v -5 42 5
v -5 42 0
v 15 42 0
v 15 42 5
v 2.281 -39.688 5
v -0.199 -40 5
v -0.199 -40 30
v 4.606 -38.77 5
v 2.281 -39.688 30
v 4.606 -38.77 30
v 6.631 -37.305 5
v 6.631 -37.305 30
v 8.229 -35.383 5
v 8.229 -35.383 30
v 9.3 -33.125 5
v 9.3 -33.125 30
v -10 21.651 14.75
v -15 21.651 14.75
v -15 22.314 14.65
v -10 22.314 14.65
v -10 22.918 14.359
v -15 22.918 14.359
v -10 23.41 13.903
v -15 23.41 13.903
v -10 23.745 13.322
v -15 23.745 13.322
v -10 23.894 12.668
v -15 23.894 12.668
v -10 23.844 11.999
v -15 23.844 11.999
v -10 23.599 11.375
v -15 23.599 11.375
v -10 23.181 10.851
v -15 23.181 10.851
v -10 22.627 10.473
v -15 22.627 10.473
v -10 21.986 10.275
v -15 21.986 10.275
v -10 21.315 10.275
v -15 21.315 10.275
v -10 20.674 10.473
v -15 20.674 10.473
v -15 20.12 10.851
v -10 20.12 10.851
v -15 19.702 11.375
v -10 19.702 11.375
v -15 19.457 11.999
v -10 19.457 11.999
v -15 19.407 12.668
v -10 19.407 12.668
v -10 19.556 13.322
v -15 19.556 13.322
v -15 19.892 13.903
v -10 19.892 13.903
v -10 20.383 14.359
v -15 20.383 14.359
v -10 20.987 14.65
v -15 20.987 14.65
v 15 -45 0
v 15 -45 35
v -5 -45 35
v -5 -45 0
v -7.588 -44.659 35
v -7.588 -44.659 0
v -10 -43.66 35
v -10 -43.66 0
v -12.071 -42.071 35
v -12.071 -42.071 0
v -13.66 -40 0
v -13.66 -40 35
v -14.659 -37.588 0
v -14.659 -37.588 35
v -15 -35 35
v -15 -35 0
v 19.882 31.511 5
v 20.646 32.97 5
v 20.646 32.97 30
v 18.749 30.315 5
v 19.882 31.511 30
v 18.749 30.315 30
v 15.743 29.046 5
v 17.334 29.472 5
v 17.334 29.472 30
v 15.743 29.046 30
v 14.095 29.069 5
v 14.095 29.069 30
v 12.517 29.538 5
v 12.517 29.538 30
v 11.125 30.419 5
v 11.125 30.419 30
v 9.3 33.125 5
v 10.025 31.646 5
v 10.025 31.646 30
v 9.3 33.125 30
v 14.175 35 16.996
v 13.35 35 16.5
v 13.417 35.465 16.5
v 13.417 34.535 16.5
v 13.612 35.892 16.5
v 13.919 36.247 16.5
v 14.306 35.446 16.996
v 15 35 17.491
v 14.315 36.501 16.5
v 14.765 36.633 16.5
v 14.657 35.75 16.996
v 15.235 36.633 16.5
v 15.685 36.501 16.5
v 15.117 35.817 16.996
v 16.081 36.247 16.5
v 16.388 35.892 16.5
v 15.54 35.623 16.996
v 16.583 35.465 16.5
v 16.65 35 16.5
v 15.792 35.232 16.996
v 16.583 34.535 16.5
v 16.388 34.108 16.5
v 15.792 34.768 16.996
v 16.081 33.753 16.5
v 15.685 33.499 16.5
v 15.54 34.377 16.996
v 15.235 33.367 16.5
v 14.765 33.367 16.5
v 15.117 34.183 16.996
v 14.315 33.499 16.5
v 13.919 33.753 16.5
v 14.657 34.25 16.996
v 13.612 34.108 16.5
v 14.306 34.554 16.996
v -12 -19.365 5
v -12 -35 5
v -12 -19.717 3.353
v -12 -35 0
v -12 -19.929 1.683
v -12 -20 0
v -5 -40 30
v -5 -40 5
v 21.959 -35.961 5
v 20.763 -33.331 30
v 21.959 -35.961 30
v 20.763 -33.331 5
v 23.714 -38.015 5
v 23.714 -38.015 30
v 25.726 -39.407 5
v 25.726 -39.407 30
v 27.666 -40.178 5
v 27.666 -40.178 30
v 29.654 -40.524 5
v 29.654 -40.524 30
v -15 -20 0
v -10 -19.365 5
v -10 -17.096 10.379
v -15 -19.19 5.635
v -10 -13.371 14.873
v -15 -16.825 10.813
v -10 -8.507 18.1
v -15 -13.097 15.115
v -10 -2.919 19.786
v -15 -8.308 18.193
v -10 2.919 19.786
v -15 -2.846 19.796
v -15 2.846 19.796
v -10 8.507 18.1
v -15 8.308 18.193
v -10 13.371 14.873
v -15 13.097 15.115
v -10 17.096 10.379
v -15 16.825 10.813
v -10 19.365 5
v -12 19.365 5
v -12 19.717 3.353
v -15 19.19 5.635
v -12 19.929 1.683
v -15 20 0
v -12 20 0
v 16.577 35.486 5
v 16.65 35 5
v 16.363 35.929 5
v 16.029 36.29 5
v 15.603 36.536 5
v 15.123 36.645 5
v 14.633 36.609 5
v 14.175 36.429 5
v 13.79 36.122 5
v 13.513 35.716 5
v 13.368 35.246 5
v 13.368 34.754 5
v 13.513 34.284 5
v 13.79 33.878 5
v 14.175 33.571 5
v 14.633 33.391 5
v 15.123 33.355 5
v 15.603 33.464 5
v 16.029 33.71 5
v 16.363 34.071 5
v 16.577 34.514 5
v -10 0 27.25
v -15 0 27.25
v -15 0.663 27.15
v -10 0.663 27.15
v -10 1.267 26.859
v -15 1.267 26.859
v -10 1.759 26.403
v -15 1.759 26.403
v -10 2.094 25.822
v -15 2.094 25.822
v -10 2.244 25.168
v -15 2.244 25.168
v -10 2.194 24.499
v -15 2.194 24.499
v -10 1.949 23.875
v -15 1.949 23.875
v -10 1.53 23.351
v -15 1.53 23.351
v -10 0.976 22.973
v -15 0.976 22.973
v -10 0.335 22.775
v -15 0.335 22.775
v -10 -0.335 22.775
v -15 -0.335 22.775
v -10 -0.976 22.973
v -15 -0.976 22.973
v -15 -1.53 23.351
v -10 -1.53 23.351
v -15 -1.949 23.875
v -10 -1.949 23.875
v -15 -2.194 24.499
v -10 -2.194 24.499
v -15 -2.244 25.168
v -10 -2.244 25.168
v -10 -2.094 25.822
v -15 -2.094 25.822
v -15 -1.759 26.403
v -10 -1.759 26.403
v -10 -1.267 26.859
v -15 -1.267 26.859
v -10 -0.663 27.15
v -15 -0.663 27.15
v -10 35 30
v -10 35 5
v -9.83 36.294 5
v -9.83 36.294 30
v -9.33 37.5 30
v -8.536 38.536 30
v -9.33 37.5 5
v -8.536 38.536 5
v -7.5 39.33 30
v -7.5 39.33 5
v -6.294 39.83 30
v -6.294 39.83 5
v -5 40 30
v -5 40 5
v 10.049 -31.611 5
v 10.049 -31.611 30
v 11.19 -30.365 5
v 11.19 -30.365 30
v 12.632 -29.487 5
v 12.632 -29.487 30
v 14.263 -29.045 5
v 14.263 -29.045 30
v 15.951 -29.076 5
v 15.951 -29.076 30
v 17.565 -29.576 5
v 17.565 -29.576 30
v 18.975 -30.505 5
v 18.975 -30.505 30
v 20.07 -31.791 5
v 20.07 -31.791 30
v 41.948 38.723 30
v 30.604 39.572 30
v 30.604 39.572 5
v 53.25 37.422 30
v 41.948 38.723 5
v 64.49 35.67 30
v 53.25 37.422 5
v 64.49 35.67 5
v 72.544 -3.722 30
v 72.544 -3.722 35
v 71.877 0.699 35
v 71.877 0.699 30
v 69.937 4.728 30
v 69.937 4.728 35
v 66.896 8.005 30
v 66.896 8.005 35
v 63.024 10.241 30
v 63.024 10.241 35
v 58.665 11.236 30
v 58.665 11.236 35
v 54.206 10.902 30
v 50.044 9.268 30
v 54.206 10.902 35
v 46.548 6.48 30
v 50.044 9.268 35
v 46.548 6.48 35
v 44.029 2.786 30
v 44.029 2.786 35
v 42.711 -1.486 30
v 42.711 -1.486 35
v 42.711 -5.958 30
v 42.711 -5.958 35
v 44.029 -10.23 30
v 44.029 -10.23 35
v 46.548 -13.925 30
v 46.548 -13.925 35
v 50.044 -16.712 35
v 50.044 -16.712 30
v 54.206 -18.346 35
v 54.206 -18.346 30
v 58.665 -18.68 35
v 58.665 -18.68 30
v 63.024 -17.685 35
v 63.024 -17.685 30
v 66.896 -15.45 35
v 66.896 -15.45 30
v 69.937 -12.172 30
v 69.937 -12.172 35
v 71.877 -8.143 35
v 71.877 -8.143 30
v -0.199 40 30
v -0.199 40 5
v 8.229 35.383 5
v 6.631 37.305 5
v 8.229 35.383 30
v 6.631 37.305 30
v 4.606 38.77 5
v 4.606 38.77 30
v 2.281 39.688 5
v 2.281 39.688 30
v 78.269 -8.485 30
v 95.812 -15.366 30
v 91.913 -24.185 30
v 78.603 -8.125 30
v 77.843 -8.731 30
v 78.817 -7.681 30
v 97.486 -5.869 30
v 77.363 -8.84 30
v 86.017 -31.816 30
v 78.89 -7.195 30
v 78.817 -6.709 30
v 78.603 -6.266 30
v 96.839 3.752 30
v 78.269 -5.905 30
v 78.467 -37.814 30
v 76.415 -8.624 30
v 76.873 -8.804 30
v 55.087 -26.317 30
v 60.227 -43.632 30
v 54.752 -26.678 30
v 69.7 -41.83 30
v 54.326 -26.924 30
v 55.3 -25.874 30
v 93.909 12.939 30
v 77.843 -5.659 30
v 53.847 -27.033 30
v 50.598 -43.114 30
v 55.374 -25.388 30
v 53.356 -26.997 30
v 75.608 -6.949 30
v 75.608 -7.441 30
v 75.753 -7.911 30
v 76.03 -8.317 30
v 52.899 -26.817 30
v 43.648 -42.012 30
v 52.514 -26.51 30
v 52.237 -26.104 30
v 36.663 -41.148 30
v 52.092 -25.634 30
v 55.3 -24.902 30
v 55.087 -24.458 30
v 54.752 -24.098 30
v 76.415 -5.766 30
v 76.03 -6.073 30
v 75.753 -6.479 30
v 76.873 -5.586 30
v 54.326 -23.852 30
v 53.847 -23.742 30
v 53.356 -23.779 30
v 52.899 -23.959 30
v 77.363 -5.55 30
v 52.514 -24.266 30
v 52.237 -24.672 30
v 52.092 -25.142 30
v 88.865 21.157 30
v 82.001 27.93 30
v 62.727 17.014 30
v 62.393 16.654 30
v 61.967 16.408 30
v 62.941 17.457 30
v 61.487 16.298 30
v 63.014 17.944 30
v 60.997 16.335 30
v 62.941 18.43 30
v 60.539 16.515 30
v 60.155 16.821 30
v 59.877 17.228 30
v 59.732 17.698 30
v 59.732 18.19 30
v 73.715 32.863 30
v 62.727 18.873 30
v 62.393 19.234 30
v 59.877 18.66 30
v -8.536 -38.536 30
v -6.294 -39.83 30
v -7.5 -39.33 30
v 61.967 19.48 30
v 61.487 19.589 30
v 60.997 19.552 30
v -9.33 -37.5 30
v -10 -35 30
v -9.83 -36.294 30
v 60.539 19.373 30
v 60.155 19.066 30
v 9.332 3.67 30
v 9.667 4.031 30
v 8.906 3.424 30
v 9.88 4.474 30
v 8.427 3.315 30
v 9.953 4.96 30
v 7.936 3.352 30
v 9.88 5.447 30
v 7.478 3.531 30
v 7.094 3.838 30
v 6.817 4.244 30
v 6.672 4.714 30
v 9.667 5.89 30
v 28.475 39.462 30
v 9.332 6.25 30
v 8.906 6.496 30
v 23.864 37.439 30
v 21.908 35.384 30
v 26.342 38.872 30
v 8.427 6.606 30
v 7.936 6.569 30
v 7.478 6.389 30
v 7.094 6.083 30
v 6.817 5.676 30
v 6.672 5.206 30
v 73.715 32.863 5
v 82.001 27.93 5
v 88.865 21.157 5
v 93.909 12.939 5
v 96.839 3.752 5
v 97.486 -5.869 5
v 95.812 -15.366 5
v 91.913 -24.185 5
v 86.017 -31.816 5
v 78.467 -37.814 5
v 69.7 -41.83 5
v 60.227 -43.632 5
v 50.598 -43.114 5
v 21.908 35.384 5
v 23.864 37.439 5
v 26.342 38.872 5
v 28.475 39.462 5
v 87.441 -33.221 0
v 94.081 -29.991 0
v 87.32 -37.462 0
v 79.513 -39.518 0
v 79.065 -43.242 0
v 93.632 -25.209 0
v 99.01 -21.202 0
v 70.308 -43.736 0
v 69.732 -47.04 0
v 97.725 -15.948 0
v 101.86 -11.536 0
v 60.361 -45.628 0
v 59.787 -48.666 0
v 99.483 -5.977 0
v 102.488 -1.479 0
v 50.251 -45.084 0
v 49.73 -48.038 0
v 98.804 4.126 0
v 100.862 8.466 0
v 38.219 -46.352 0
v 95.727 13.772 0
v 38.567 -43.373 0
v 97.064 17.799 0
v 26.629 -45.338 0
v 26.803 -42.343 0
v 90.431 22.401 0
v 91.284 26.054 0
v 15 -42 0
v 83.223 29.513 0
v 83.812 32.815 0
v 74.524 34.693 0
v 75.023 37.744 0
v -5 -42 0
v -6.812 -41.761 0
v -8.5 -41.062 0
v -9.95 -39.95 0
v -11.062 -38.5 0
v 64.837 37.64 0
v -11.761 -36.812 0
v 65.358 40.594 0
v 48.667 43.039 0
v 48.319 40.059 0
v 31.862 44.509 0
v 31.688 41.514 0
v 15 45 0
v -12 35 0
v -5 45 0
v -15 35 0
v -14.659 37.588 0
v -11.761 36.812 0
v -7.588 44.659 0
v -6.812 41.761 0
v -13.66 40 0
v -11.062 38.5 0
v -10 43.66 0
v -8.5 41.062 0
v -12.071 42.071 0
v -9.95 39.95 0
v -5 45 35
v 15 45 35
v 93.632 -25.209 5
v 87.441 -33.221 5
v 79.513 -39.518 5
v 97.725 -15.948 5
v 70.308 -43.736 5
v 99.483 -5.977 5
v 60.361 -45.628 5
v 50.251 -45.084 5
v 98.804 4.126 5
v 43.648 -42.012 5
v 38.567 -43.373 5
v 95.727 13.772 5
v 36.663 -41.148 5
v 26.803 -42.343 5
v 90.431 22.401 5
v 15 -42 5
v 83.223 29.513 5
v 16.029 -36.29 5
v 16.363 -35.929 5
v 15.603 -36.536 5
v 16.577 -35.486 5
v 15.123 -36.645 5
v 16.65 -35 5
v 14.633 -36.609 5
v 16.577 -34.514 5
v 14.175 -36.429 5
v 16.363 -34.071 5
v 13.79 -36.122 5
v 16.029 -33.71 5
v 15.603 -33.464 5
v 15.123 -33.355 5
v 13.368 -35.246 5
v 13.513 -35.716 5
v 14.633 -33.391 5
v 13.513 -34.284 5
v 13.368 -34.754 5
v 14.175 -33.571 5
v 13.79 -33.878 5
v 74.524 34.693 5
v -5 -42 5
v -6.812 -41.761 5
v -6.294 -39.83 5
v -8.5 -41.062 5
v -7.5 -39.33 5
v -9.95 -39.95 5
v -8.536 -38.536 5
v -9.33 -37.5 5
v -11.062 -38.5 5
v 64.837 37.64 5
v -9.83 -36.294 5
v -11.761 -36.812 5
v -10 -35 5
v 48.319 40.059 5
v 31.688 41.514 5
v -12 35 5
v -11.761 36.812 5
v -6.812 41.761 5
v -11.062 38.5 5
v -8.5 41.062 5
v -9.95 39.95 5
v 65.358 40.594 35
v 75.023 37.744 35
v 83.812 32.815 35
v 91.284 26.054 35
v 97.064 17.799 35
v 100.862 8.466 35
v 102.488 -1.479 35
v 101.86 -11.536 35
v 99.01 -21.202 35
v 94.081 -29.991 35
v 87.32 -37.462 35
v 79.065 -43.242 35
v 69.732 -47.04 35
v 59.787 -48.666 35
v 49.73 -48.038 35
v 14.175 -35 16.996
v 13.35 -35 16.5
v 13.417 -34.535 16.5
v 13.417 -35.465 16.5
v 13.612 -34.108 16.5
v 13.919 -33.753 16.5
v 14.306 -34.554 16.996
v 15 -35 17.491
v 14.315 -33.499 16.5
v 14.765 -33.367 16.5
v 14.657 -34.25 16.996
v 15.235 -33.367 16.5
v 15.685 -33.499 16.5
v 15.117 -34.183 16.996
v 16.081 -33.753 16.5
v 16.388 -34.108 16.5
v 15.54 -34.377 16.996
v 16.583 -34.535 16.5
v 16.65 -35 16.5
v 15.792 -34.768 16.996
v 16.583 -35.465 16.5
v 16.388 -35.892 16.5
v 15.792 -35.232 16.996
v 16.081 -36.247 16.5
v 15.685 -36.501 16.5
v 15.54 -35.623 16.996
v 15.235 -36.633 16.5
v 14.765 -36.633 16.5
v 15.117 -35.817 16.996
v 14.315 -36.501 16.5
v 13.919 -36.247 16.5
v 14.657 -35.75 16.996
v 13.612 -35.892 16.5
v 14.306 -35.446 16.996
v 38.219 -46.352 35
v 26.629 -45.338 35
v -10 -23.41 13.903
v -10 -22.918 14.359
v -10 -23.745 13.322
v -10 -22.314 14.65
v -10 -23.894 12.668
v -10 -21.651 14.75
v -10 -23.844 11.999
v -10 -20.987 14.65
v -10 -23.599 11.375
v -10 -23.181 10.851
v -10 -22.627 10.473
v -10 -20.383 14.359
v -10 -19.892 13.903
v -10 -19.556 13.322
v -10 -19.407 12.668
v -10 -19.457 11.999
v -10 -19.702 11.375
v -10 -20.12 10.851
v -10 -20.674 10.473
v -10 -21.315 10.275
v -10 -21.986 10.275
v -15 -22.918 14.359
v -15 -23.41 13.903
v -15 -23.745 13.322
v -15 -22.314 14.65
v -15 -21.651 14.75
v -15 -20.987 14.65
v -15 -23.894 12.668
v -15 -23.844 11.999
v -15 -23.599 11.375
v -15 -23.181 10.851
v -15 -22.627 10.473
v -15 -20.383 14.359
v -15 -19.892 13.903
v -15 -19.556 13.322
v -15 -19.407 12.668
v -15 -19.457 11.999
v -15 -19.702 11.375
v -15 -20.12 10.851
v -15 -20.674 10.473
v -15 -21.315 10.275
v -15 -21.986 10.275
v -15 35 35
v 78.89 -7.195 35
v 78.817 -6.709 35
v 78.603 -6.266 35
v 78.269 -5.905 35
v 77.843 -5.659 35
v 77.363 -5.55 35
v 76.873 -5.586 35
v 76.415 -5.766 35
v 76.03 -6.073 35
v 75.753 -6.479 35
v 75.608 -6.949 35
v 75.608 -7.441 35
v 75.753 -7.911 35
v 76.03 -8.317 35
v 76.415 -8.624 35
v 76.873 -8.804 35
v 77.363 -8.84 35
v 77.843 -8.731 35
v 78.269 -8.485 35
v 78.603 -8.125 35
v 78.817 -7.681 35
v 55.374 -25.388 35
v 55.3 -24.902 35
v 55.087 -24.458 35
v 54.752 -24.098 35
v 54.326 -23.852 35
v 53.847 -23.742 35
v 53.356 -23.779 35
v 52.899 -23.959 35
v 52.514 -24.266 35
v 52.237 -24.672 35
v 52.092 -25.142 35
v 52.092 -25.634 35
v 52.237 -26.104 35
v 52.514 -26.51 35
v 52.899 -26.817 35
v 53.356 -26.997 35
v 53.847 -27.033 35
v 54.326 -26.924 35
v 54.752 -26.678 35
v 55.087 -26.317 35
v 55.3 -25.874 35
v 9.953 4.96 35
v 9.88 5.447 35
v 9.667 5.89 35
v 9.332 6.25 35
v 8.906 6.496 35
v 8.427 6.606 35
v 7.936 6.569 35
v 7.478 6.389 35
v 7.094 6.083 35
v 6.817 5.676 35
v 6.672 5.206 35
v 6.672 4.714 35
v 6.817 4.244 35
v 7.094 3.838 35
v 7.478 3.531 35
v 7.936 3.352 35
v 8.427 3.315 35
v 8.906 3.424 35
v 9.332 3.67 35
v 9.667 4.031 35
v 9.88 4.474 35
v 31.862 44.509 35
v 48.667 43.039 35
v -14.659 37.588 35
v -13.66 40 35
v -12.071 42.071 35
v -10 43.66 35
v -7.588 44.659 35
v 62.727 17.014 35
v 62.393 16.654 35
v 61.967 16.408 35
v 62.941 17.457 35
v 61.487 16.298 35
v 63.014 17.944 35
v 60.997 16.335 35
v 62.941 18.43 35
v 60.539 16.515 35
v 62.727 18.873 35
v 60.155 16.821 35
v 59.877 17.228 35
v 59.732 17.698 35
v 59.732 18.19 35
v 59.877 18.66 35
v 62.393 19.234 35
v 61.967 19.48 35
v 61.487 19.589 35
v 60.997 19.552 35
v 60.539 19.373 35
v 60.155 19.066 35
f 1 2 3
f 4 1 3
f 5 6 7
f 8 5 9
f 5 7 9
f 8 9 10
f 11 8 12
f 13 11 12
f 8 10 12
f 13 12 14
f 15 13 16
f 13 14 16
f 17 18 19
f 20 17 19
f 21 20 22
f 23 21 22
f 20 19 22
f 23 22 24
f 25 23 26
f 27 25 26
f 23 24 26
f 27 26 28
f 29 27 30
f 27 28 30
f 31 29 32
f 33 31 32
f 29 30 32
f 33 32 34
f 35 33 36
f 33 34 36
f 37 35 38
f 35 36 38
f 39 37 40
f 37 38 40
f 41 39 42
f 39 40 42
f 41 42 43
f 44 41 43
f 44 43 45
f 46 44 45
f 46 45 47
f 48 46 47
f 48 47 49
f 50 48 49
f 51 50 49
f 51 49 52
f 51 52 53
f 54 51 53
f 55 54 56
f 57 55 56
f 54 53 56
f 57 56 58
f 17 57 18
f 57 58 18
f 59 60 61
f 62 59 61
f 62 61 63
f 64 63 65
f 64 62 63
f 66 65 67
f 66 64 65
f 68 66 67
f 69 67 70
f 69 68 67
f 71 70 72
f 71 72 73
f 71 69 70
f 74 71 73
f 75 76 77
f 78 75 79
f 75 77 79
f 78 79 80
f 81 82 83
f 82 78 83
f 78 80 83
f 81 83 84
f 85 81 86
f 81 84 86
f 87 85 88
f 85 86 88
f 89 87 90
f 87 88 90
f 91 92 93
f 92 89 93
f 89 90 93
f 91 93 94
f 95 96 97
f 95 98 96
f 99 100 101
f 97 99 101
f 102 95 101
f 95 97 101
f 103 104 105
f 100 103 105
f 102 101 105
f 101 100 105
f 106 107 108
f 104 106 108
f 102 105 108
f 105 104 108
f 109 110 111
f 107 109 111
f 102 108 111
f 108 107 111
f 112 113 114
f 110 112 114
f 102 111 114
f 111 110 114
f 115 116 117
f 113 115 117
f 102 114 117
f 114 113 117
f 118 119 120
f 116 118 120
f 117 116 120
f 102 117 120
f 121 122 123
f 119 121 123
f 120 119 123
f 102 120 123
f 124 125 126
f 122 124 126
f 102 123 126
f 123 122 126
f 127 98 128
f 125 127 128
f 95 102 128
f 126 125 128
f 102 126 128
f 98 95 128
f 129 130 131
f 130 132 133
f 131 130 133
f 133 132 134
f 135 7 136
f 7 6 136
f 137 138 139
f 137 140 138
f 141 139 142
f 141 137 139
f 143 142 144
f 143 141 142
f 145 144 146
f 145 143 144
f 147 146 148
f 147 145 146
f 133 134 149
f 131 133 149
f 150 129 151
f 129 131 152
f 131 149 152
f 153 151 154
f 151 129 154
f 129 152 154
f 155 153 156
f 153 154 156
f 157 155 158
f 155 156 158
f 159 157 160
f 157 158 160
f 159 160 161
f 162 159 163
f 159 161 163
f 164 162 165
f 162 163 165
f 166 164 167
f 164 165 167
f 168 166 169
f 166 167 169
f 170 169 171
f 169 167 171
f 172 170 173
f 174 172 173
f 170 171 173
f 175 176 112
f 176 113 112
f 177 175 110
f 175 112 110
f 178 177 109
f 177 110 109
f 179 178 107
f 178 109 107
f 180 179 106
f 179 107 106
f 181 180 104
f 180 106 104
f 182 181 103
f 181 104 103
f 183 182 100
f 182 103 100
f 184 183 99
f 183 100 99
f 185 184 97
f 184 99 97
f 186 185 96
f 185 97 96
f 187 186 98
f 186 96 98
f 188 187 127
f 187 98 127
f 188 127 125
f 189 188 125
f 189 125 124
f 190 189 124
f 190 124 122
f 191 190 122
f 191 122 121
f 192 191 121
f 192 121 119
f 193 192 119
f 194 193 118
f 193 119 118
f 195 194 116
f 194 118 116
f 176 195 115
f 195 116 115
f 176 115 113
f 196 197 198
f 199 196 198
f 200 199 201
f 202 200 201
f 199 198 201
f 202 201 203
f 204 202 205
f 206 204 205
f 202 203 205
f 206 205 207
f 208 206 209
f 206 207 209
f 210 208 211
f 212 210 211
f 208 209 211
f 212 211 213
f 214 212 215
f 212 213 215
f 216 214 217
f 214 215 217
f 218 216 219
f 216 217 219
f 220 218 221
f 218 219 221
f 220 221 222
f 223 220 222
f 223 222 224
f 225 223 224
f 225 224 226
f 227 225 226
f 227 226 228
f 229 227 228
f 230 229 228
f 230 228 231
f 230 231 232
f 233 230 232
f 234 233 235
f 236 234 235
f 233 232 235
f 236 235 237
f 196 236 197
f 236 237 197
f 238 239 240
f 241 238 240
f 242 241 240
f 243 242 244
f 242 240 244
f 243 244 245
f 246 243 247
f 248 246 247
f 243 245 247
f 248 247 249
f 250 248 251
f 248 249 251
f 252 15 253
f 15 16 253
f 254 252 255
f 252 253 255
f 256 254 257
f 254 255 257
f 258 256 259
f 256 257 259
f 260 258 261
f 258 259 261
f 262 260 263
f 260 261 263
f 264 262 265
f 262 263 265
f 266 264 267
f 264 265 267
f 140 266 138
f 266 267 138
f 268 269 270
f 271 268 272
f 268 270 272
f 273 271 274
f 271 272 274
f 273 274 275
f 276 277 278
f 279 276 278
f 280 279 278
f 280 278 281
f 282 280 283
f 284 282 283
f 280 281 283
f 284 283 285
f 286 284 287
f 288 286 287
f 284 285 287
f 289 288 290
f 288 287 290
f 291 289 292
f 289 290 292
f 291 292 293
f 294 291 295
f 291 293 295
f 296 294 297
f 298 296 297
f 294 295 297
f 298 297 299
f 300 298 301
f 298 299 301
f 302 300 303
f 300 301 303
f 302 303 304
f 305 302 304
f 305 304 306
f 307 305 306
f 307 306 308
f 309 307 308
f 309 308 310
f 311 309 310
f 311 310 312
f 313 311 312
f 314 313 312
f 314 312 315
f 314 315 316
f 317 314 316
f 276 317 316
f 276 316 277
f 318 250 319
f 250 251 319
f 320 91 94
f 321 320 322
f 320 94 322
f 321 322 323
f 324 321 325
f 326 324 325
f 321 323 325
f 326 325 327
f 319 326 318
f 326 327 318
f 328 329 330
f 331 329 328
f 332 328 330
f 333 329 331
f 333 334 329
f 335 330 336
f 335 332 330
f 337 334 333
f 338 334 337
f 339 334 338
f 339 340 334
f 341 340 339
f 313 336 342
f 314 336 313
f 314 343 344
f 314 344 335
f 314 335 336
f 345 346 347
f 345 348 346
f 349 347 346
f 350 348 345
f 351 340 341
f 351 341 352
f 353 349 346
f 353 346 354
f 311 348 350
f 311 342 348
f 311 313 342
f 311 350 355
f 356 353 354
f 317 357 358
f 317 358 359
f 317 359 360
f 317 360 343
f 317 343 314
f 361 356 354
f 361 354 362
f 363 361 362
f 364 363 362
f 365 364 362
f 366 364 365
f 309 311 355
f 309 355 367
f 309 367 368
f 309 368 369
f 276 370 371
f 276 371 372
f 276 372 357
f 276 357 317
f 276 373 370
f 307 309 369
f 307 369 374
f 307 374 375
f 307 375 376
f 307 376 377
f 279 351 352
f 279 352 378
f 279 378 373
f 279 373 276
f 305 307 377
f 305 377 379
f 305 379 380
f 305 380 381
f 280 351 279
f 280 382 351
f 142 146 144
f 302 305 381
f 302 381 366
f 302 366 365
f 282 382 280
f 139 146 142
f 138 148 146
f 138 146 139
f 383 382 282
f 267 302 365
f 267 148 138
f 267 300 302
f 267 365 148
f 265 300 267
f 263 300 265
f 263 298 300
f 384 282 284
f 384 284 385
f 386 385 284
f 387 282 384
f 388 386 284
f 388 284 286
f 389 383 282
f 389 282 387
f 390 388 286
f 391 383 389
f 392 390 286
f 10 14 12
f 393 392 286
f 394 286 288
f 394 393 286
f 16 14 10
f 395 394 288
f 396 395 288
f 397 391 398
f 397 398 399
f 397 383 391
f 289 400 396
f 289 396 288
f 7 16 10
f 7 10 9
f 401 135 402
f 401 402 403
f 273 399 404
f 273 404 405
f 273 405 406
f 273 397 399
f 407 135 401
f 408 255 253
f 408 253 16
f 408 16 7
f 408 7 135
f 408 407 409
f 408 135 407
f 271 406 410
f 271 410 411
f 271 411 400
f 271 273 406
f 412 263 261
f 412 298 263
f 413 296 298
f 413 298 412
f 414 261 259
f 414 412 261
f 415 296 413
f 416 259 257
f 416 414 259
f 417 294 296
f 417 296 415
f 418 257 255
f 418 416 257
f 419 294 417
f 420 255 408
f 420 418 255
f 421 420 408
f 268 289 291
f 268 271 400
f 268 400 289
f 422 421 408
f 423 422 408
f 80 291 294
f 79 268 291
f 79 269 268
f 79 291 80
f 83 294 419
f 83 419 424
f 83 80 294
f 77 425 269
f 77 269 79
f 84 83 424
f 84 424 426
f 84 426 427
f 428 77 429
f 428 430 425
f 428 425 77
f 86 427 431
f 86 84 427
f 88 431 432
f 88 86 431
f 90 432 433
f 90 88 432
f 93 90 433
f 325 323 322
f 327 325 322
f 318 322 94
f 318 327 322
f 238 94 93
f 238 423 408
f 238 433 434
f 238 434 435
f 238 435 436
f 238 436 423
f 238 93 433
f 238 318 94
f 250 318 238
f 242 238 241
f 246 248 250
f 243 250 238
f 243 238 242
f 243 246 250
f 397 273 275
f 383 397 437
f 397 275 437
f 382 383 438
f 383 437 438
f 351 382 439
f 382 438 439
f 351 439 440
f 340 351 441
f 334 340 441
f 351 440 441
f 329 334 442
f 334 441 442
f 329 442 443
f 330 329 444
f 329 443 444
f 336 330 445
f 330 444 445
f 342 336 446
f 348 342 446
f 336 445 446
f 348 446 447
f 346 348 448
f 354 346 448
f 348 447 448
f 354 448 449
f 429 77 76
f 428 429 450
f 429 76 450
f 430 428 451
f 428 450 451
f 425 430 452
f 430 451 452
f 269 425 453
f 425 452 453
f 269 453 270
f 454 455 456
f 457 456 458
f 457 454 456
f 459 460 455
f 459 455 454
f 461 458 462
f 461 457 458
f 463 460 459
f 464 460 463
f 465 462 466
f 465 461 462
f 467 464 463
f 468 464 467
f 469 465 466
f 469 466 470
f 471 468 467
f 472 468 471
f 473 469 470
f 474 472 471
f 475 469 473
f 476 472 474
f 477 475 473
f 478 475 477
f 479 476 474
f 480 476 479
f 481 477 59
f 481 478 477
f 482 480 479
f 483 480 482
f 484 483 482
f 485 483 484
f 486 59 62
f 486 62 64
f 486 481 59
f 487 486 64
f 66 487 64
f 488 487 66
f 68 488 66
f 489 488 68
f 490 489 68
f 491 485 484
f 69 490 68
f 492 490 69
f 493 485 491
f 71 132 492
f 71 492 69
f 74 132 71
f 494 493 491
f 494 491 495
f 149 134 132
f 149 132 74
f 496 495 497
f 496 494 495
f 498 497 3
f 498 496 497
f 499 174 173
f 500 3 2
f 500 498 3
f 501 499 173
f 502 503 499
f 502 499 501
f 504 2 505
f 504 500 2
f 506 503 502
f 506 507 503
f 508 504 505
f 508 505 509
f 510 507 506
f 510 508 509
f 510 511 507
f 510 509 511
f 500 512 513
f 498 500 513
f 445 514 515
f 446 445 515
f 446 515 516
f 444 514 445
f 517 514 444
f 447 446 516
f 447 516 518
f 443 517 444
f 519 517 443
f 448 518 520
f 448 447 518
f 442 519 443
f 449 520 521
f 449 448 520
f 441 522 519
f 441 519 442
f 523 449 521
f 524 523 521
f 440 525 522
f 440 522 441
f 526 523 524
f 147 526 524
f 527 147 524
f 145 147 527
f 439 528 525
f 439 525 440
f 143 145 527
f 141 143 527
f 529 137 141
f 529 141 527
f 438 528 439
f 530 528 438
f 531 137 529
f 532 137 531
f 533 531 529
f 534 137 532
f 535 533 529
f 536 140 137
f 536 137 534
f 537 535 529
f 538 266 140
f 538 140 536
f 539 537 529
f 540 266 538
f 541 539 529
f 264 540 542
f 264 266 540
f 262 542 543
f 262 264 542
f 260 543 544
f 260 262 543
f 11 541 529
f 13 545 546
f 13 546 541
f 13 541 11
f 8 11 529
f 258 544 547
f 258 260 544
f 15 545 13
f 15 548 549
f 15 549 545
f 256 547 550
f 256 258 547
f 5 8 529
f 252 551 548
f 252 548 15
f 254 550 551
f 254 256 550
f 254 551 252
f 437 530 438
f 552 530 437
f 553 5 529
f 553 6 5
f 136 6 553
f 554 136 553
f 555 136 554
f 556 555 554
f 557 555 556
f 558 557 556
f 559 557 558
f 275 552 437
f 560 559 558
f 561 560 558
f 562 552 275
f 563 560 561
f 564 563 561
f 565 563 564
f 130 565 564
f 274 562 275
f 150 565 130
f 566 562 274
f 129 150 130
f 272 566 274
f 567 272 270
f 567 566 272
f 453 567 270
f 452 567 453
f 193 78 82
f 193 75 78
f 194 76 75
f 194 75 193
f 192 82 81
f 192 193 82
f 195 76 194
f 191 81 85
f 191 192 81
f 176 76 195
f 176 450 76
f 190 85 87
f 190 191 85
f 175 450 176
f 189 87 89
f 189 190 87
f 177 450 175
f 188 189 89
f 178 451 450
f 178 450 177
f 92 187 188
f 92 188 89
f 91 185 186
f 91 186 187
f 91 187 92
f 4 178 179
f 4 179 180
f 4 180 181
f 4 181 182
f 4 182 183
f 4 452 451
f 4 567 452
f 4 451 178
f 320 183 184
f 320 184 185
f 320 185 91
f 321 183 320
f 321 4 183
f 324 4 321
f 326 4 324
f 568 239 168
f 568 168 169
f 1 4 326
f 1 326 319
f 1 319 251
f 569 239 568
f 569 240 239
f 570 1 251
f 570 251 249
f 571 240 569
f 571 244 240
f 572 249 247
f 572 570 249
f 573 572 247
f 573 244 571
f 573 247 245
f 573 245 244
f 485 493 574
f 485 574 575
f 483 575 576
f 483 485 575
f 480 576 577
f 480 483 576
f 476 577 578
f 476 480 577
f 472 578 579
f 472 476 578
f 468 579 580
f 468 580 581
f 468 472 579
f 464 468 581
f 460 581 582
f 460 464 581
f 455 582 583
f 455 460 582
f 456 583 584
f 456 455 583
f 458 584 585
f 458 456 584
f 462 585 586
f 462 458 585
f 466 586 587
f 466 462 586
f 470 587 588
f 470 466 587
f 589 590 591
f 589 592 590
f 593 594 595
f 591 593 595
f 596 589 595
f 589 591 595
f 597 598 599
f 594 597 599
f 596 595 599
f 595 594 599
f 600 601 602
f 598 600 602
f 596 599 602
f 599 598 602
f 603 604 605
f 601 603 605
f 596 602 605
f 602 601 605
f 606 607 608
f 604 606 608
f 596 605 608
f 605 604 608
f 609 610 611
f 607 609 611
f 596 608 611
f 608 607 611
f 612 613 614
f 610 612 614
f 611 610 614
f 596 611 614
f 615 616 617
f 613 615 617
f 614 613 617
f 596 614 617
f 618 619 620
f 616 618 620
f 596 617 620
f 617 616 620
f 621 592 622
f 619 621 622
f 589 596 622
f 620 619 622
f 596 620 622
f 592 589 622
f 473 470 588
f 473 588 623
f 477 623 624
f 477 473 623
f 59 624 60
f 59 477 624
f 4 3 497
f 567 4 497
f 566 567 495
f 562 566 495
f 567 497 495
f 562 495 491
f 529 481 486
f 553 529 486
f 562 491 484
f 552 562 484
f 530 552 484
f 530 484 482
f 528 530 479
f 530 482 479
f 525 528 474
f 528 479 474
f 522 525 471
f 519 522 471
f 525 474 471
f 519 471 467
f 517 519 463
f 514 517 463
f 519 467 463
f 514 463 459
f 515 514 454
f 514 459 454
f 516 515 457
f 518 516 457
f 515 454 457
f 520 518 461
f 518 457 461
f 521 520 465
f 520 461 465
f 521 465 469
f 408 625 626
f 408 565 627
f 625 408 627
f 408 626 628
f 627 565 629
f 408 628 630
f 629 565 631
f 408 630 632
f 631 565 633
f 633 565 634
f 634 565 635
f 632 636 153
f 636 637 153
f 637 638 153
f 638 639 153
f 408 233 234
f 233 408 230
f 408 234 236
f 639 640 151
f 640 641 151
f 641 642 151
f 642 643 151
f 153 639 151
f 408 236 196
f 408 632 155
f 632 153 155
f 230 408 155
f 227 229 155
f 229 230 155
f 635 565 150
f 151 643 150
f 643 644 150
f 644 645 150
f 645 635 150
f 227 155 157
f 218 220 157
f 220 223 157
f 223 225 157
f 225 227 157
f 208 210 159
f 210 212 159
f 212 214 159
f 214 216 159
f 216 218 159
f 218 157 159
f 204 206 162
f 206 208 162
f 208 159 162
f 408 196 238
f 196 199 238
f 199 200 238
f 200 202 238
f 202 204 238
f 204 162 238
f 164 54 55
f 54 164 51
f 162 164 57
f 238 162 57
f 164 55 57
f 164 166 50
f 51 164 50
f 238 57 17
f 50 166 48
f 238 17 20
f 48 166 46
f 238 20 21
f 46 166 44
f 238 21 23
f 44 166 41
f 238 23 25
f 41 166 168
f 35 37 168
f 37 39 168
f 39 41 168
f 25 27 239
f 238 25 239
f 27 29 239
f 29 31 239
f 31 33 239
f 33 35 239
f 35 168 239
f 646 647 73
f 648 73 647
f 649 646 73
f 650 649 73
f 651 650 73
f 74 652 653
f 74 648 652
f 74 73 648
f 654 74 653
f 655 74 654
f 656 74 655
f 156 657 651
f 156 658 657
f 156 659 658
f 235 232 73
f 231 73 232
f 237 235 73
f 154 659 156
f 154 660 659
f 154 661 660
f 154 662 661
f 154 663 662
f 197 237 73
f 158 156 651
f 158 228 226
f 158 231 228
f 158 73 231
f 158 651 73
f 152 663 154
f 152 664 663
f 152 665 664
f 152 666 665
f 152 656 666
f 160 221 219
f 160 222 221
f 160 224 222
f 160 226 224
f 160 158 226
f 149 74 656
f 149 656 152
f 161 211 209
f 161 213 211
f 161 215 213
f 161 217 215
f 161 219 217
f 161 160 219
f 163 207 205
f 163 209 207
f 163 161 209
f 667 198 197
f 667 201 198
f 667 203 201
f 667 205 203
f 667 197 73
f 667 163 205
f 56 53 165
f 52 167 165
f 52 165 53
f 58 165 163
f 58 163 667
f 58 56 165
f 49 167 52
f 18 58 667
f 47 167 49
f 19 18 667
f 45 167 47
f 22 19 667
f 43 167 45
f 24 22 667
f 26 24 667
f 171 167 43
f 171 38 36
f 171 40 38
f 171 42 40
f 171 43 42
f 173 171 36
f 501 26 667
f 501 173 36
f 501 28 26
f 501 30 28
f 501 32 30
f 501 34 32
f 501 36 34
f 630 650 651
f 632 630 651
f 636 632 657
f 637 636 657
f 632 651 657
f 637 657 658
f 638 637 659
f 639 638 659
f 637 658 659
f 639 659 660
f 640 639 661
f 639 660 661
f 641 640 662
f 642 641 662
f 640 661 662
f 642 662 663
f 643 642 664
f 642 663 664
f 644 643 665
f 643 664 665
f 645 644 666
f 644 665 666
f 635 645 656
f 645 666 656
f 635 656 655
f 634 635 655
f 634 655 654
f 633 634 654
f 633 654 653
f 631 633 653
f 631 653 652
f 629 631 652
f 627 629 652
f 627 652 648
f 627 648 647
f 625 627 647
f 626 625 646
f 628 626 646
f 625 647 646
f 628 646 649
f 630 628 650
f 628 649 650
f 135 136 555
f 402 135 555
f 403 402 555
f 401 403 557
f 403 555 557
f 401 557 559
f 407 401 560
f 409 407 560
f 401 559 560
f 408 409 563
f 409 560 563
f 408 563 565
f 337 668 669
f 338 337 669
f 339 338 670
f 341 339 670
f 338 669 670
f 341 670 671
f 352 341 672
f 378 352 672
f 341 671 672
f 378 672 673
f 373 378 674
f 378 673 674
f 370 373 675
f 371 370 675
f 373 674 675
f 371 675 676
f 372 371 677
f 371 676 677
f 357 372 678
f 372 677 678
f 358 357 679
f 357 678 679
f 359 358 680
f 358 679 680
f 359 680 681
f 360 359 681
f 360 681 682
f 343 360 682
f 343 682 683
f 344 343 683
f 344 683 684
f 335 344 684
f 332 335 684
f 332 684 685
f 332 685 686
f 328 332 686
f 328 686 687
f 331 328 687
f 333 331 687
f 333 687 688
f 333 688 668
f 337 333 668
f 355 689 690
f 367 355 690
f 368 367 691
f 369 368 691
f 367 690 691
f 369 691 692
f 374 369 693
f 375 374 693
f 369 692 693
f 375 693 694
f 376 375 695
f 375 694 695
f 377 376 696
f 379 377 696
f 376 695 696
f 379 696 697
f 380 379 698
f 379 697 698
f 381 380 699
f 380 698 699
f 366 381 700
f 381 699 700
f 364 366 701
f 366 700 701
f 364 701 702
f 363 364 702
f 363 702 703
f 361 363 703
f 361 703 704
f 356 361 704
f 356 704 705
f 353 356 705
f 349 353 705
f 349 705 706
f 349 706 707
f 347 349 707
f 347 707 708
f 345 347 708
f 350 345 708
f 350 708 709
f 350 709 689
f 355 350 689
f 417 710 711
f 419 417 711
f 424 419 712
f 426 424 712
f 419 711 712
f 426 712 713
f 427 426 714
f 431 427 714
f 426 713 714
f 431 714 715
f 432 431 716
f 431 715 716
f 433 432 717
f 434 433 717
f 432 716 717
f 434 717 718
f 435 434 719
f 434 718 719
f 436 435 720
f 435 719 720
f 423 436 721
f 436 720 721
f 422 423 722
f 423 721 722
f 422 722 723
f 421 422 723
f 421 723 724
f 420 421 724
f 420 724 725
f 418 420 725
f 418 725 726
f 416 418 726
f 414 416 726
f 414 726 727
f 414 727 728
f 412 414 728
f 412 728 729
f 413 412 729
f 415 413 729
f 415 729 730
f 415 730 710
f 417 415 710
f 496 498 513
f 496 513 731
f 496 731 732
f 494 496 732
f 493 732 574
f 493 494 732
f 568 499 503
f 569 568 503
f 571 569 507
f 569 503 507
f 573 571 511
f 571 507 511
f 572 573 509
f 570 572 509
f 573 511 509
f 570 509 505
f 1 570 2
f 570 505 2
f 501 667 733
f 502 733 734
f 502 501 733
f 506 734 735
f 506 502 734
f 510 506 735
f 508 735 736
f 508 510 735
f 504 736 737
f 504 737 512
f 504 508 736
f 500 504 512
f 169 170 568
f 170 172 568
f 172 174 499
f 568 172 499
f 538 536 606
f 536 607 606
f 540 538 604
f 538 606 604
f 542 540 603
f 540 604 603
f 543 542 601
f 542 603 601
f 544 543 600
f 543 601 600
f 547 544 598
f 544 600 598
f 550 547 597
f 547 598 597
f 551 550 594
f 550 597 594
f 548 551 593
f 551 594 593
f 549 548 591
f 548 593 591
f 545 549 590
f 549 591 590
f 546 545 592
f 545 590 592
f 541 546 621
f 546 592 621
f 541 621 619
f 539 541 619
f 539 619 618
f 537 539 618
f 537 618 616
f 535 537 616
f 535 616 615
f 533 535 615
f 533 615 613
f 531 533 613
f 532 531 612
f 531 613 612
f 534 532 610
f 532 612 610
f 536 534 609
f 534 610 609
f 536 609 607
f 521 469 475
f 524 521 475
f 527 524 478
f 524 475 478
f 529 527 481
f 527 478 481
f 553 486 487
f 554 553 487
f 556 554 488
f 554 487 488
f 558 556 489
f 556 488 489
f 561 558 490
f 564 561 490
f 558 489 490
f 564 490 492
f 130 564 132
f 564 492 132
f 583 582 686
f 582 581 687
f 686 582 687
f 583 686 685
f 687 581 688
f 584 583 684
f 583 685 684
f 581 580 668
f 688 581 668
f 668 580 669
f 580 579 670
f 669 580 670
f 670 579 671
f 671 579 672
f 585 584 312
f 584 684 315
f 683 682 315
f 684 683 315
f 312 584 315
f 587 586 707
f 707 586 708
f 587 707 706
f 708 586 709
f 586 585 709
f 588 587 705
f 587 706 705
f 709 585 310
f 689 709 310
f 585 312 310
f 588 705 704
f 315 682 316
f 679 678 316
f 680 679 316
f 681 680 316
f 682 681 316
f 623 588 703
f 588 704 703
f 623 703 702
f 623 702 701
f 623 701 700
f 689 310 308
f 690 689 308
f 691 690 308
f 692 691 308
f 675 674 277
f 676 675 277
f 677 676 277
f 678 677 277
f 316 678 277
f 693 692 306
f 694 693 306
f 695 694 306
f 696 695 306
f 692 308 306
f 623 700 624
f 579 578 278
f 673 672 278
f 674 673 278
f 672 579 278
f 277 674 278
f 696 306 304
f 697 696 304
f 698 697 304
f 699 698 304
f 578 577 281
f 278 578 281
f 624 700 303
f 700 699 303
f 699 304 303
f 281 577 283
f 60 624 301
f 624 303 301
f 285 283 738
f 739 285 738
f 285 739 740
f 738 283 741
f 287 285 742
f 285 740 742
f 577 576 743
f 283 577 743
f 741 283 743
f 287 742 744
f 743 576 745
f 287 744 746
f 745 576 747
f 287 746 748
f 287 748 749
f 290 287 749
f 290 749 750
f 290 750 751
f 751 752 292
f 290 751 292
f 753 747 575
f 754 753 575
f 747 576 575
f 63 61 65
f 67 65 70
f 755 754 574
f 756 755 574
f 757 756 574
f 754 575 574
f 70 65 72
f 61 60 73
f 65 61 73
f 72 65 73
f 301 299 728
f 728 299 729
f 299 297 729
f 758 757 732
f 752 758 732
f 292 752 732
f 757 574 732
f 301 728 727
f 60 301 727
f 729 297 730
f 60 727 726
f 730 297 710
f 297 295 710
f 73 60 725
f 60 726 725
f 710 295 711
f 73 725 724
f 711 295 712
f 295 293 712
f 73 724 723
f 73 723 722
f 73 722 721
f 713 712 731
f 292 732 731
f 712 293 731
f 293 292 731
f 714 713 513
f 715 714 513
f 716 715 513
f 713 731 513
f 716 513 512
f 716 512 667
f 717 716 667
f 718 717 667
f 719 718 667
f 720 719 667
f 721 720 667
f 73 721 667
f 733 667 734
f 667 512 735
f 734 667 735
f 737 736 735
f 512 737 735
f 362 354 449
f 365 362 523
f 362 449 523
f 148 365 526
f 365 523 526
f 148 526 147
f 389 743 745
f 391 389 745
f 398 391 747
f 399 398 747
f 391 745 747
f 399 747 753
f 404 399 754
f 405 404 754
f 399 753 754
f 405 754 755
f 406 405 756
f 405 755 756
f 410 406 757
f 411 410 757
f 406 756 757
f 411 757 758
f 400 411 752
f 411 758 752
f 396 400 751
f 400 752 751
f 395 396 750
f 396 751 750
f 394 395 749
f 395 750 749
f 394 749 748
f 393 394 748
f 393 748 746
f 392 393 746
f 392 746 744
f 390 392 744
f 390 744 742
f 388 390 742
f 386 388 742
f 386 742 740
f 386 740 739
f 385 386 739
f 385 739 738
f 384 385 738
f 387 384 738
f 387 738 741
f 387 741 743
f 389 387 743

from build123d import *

# Parameters (mm, degrees)
EXTRUDE_1_DEPTH        = 35
CUT_EXTRUDE_1_DEPTH    = 30
SKETCH_3_R             = 20
SKETCH_3_R_2           = 2.25
CUT_EXTRUDE_2_DEPTH    = 5
CUT_EXTRUDE_3_REACH    = 37
SKETCH_4_R             = 15
CUT_EXTRUDE_5_DEPTH    = 5
SKETCH_8_R             = 6
EXTRUDE_2_DEPTH        = 25
FILLET_1_R             = 10
HOLE_WIZARD_M4_2_D     = 3.3
HOLE_WIZARD_M4_2_DEPTH = 11.5
HOLE_WIZARD_M4_2_TIP   = 0.991420021
HOLE_WIZARD_M4_3_D     = 3.3
HOLE_WIZARD_M4_3_DEPTH = 11.5
HOLE_WIZARD_M4_3_TIP   = 0.991420021


with BuildPart() as part:
    # 스케치1 → 보스-돌출1 (new body)
    with BuildSketch(Plane.XY):
        with BuildLine():
            Line((-5, 45), (15, 45))
            ThreePointArc((15, 45), (40.275165397, 43.896462447), (65.357971523, 40.594248374))
            ThreePointArc((65.357971523, 40.594248374), (101.860152414, -11.536268507), (49.729635533, -48.038449398))
            ThreePointArc((49.729635533, -48.038449398), (32.43114855, -45.761060382), (15, -45))
            Line((15, -45), (-5, -45))
            ThreePointArc((-5, -45), (-12.071067812, -42.071067812), (-15, -35))
            Line((-15, -35), (-15, 35))
            ThreePointArc((-15, 35), (-12.071067812, 42.071067812), (-5, 45))
        make_face()
    extrude(amount=EXTRUDE_1_DEPTH)

    # 스케치2 → 컷-돌출1 (cut)
    with BuildSketch(Plane(origin=(0, 0, 0), x_dir=(-1, 0, 0), z_dir=(0, 0, -1))):
        with BuildLine():
            Line((-15, -40), (5, -40))
            ThreePointArc((5, -40), (8.535533906, -38.535533906), (10, -35))
            Line((10, -35), (10, 35))
            ThreePointArc((10, 35), (8.535533906, 38.535533906), (5, 40))
            Line((5, 40), (-15, 40))
            ThreePointArc((-15, 40), (-39.839386683, 38.915488956), (-64.489730635, 35.670209608))
            ThreePointArc((-64.489730635, 35.670209608), (-96.936113649, -10.668027619), (-50.597876422, -43.114410632))
            ThreePointArc((-50.597876422, -43.114410632), (-32.866927263, -40.780086891), (-15, -40))
        make_face()
    extrude(amount=-CUT_EXTRUDE_1_DEPTH, mode=Mode.SUBTRACT)

    # 스케치3 → 컷-돌출2 (cut)
    with BuildSketch(Plane.ZY.offset(15)):
        Circle(SKETCH_3_R)
        with Locations((12.5, 21.650635095)):
            Circle(SKETCH_3_R_2)
        with Locations((25, 0)):
            Circle(SKETCH_3_R_2)
        with Locations((12.5, -21.650635095)):
            Circle(SKETCH_3_R_2)
    extrude(amount=-CUT_EXTRUDE_2_DEPTH, mode=Mode.SUBTRACT)

    # 스케치4 → 컷-돌출3 (cut, up to next)
    with BuildSketch(Plane.XY.offset(35), mode=Mode.PRIVATE) as cut_extrude_3_sk1:
        with Locations((57.543803528, -3.722100512)):
            Circle(SKETCH_4_R)
    cut_extrude_3_tool1 = extrude(cut_extrude_3_sk1.sketch, amount=-CUT_EXTRUDE_3_REACH, mode=Mode.PRIVATE) & part.part
    add(cut_extrude_3_tool1.solids().sort_by_distance((57.543804, -3.722101, 35))[0], mode=Mode.SUBTRACT)

    # 스케치6 → 컷-돌출5 (cut)
    with BuildSketch(Plane(origin=(0, 0, 0), x_dir=(-1, 0, 0), z_dir=(0, 0, -1))):
        with BuildLine():
            Line((10, 21.02711573), (10, 19.021261947))
            Line((10, 19.021261947), (12, 19.021261947))
            Line((12, 19.021261947), (12, 21.02711573))
            Line((12, 21.02711573), (12, 35))
            ThreePointArc((12, 35), (9.949747468, 39.949747468), (5, 42))
            Line((5, 42), (-15, 42))
            ThreePointArc((-15, 42), (-40.013698169, 40.907878352), (-64.83702699, 37.639825115))
            ThreePointArc((-64.83702699, 37.639825115), (-98.905729155, -11.015323974), (-50.250580066, -45.084026139))
            ThreePointArc((-50.250580066, -45.084026139), (-32.692615778, -42.772476287), (-15, -42))
            Line((-15, -42), (5, -42))
            ThreePointArc((5, -42), (9.949747468, -39.949747468), (12, -35))
            Line((12, -35), (12, -19.081512787))
            Line((12, -19.081512787), (10, -19.081512787))
            Line((10, -19.081512787), (10, -35))
            ThreePointArc((10, -35), (8.535533906, -38.535533906), (5, -40))
            Line((5, -40), (-15, -40))
            ThreePointArc((-15, -40), (-32.866927263, -40.780086891), (-50.597876422, -43.114410632))
            ThreePointArc((-50.597876422, -43.114410632), (-96.936113649, -10.668027619), (-64.489730635, 35.670209608))
            ThreePointArc((-64.489730635, 35.670209608), (-39.839386683, 38.915488956), (-15, 40))
            Line((-15, 40), (5, 40))
            ThreePointArc((5, 40), (8.535533906, 38.535533906), (10, 35))
            Line((10, 35), (10, 21.02711573))
        make_face()
    extrude(amount=-CUT_EXTRUDE_5_DEPTH, mode=Mode.SUBTRACT)

    # 스케치8 → 보스-돌출2 (add)
    with BuildSketch(Plane(origin=(0, 0, 30), x_dir=(-1, 0, 0), z_dir=(0, 0, -1))):
        with Locations((-15, 35)):
            Circle(SKETCH_8_R)
        with Locations((-15, -35)):
            Circle(SKETCH_8_R)
    extrude(amount=EXTRUDE_2_DEPTH)

    # 필렛1
    fillet_1_edges = [part.edges().sort_by_distance(p)[0] for p in [
        (18.346048824, 39.980357143, 17.5),
        (11.68337521, 40, 17.5),
        (18.276798635, -40.026190476, 17.5),
        (11.68337521, -40, 17.5),
    ]]
    fillet(fillet_1_edges, radius=FILLET_1_R)

    # M4 나사 구멍2
    with Locations(Plane(origin=(0, 0, 30), x_dir=(-1, 0, 0), z_dir=(0, 0, -1))):
        with Locations((-61.364063437, 17.943670054), (-77.239958589, -7.195064065), (-53.72354362, -25.387871078), (-8.303415878, 4.960308371)):
            Hole(HOLE_WIZARD_M4_2_D / 2, depth=HOLE_WIZARD_M4_2_DEPTH)
            with Locations((0, 0, -(HOLE_WIZARD_M4_2_DEPTH + HOLE_WIZARD_M4_2_TIP / 2))):  # 118° drill point
                Cone(0, HOLE_WIZARD_M4_2_D / 2, HOLE_WIZARD_M4_2_TIP, mode=Mode.SUBTRACT)

    # M4 나사 구멍3
    with Locations(Plane(origin=(0, 0, 5), x_dir=(-1, 0, 0), z_dir=(0, 0, -1))):
        with Locations((-15, 35), (-15, -35)):
            Hole(HOLE_WIZARD_M4_3_D / 2, depth=HOLE_WIZARD_M4_3_DEPTH)
            with Locations((0, 0, -(HOLE_WIZARD_M4_3_DEPTH + HOLE_WIZARD_M4_3_TIP / 2))):  # 118° drill point
                Cone(0, HOLE_WIZARD_M4_3_D / 2, HOLE_WIZARD_M4_3_TIP, mode=Mode.SUBTRACT)


solid = part.part
